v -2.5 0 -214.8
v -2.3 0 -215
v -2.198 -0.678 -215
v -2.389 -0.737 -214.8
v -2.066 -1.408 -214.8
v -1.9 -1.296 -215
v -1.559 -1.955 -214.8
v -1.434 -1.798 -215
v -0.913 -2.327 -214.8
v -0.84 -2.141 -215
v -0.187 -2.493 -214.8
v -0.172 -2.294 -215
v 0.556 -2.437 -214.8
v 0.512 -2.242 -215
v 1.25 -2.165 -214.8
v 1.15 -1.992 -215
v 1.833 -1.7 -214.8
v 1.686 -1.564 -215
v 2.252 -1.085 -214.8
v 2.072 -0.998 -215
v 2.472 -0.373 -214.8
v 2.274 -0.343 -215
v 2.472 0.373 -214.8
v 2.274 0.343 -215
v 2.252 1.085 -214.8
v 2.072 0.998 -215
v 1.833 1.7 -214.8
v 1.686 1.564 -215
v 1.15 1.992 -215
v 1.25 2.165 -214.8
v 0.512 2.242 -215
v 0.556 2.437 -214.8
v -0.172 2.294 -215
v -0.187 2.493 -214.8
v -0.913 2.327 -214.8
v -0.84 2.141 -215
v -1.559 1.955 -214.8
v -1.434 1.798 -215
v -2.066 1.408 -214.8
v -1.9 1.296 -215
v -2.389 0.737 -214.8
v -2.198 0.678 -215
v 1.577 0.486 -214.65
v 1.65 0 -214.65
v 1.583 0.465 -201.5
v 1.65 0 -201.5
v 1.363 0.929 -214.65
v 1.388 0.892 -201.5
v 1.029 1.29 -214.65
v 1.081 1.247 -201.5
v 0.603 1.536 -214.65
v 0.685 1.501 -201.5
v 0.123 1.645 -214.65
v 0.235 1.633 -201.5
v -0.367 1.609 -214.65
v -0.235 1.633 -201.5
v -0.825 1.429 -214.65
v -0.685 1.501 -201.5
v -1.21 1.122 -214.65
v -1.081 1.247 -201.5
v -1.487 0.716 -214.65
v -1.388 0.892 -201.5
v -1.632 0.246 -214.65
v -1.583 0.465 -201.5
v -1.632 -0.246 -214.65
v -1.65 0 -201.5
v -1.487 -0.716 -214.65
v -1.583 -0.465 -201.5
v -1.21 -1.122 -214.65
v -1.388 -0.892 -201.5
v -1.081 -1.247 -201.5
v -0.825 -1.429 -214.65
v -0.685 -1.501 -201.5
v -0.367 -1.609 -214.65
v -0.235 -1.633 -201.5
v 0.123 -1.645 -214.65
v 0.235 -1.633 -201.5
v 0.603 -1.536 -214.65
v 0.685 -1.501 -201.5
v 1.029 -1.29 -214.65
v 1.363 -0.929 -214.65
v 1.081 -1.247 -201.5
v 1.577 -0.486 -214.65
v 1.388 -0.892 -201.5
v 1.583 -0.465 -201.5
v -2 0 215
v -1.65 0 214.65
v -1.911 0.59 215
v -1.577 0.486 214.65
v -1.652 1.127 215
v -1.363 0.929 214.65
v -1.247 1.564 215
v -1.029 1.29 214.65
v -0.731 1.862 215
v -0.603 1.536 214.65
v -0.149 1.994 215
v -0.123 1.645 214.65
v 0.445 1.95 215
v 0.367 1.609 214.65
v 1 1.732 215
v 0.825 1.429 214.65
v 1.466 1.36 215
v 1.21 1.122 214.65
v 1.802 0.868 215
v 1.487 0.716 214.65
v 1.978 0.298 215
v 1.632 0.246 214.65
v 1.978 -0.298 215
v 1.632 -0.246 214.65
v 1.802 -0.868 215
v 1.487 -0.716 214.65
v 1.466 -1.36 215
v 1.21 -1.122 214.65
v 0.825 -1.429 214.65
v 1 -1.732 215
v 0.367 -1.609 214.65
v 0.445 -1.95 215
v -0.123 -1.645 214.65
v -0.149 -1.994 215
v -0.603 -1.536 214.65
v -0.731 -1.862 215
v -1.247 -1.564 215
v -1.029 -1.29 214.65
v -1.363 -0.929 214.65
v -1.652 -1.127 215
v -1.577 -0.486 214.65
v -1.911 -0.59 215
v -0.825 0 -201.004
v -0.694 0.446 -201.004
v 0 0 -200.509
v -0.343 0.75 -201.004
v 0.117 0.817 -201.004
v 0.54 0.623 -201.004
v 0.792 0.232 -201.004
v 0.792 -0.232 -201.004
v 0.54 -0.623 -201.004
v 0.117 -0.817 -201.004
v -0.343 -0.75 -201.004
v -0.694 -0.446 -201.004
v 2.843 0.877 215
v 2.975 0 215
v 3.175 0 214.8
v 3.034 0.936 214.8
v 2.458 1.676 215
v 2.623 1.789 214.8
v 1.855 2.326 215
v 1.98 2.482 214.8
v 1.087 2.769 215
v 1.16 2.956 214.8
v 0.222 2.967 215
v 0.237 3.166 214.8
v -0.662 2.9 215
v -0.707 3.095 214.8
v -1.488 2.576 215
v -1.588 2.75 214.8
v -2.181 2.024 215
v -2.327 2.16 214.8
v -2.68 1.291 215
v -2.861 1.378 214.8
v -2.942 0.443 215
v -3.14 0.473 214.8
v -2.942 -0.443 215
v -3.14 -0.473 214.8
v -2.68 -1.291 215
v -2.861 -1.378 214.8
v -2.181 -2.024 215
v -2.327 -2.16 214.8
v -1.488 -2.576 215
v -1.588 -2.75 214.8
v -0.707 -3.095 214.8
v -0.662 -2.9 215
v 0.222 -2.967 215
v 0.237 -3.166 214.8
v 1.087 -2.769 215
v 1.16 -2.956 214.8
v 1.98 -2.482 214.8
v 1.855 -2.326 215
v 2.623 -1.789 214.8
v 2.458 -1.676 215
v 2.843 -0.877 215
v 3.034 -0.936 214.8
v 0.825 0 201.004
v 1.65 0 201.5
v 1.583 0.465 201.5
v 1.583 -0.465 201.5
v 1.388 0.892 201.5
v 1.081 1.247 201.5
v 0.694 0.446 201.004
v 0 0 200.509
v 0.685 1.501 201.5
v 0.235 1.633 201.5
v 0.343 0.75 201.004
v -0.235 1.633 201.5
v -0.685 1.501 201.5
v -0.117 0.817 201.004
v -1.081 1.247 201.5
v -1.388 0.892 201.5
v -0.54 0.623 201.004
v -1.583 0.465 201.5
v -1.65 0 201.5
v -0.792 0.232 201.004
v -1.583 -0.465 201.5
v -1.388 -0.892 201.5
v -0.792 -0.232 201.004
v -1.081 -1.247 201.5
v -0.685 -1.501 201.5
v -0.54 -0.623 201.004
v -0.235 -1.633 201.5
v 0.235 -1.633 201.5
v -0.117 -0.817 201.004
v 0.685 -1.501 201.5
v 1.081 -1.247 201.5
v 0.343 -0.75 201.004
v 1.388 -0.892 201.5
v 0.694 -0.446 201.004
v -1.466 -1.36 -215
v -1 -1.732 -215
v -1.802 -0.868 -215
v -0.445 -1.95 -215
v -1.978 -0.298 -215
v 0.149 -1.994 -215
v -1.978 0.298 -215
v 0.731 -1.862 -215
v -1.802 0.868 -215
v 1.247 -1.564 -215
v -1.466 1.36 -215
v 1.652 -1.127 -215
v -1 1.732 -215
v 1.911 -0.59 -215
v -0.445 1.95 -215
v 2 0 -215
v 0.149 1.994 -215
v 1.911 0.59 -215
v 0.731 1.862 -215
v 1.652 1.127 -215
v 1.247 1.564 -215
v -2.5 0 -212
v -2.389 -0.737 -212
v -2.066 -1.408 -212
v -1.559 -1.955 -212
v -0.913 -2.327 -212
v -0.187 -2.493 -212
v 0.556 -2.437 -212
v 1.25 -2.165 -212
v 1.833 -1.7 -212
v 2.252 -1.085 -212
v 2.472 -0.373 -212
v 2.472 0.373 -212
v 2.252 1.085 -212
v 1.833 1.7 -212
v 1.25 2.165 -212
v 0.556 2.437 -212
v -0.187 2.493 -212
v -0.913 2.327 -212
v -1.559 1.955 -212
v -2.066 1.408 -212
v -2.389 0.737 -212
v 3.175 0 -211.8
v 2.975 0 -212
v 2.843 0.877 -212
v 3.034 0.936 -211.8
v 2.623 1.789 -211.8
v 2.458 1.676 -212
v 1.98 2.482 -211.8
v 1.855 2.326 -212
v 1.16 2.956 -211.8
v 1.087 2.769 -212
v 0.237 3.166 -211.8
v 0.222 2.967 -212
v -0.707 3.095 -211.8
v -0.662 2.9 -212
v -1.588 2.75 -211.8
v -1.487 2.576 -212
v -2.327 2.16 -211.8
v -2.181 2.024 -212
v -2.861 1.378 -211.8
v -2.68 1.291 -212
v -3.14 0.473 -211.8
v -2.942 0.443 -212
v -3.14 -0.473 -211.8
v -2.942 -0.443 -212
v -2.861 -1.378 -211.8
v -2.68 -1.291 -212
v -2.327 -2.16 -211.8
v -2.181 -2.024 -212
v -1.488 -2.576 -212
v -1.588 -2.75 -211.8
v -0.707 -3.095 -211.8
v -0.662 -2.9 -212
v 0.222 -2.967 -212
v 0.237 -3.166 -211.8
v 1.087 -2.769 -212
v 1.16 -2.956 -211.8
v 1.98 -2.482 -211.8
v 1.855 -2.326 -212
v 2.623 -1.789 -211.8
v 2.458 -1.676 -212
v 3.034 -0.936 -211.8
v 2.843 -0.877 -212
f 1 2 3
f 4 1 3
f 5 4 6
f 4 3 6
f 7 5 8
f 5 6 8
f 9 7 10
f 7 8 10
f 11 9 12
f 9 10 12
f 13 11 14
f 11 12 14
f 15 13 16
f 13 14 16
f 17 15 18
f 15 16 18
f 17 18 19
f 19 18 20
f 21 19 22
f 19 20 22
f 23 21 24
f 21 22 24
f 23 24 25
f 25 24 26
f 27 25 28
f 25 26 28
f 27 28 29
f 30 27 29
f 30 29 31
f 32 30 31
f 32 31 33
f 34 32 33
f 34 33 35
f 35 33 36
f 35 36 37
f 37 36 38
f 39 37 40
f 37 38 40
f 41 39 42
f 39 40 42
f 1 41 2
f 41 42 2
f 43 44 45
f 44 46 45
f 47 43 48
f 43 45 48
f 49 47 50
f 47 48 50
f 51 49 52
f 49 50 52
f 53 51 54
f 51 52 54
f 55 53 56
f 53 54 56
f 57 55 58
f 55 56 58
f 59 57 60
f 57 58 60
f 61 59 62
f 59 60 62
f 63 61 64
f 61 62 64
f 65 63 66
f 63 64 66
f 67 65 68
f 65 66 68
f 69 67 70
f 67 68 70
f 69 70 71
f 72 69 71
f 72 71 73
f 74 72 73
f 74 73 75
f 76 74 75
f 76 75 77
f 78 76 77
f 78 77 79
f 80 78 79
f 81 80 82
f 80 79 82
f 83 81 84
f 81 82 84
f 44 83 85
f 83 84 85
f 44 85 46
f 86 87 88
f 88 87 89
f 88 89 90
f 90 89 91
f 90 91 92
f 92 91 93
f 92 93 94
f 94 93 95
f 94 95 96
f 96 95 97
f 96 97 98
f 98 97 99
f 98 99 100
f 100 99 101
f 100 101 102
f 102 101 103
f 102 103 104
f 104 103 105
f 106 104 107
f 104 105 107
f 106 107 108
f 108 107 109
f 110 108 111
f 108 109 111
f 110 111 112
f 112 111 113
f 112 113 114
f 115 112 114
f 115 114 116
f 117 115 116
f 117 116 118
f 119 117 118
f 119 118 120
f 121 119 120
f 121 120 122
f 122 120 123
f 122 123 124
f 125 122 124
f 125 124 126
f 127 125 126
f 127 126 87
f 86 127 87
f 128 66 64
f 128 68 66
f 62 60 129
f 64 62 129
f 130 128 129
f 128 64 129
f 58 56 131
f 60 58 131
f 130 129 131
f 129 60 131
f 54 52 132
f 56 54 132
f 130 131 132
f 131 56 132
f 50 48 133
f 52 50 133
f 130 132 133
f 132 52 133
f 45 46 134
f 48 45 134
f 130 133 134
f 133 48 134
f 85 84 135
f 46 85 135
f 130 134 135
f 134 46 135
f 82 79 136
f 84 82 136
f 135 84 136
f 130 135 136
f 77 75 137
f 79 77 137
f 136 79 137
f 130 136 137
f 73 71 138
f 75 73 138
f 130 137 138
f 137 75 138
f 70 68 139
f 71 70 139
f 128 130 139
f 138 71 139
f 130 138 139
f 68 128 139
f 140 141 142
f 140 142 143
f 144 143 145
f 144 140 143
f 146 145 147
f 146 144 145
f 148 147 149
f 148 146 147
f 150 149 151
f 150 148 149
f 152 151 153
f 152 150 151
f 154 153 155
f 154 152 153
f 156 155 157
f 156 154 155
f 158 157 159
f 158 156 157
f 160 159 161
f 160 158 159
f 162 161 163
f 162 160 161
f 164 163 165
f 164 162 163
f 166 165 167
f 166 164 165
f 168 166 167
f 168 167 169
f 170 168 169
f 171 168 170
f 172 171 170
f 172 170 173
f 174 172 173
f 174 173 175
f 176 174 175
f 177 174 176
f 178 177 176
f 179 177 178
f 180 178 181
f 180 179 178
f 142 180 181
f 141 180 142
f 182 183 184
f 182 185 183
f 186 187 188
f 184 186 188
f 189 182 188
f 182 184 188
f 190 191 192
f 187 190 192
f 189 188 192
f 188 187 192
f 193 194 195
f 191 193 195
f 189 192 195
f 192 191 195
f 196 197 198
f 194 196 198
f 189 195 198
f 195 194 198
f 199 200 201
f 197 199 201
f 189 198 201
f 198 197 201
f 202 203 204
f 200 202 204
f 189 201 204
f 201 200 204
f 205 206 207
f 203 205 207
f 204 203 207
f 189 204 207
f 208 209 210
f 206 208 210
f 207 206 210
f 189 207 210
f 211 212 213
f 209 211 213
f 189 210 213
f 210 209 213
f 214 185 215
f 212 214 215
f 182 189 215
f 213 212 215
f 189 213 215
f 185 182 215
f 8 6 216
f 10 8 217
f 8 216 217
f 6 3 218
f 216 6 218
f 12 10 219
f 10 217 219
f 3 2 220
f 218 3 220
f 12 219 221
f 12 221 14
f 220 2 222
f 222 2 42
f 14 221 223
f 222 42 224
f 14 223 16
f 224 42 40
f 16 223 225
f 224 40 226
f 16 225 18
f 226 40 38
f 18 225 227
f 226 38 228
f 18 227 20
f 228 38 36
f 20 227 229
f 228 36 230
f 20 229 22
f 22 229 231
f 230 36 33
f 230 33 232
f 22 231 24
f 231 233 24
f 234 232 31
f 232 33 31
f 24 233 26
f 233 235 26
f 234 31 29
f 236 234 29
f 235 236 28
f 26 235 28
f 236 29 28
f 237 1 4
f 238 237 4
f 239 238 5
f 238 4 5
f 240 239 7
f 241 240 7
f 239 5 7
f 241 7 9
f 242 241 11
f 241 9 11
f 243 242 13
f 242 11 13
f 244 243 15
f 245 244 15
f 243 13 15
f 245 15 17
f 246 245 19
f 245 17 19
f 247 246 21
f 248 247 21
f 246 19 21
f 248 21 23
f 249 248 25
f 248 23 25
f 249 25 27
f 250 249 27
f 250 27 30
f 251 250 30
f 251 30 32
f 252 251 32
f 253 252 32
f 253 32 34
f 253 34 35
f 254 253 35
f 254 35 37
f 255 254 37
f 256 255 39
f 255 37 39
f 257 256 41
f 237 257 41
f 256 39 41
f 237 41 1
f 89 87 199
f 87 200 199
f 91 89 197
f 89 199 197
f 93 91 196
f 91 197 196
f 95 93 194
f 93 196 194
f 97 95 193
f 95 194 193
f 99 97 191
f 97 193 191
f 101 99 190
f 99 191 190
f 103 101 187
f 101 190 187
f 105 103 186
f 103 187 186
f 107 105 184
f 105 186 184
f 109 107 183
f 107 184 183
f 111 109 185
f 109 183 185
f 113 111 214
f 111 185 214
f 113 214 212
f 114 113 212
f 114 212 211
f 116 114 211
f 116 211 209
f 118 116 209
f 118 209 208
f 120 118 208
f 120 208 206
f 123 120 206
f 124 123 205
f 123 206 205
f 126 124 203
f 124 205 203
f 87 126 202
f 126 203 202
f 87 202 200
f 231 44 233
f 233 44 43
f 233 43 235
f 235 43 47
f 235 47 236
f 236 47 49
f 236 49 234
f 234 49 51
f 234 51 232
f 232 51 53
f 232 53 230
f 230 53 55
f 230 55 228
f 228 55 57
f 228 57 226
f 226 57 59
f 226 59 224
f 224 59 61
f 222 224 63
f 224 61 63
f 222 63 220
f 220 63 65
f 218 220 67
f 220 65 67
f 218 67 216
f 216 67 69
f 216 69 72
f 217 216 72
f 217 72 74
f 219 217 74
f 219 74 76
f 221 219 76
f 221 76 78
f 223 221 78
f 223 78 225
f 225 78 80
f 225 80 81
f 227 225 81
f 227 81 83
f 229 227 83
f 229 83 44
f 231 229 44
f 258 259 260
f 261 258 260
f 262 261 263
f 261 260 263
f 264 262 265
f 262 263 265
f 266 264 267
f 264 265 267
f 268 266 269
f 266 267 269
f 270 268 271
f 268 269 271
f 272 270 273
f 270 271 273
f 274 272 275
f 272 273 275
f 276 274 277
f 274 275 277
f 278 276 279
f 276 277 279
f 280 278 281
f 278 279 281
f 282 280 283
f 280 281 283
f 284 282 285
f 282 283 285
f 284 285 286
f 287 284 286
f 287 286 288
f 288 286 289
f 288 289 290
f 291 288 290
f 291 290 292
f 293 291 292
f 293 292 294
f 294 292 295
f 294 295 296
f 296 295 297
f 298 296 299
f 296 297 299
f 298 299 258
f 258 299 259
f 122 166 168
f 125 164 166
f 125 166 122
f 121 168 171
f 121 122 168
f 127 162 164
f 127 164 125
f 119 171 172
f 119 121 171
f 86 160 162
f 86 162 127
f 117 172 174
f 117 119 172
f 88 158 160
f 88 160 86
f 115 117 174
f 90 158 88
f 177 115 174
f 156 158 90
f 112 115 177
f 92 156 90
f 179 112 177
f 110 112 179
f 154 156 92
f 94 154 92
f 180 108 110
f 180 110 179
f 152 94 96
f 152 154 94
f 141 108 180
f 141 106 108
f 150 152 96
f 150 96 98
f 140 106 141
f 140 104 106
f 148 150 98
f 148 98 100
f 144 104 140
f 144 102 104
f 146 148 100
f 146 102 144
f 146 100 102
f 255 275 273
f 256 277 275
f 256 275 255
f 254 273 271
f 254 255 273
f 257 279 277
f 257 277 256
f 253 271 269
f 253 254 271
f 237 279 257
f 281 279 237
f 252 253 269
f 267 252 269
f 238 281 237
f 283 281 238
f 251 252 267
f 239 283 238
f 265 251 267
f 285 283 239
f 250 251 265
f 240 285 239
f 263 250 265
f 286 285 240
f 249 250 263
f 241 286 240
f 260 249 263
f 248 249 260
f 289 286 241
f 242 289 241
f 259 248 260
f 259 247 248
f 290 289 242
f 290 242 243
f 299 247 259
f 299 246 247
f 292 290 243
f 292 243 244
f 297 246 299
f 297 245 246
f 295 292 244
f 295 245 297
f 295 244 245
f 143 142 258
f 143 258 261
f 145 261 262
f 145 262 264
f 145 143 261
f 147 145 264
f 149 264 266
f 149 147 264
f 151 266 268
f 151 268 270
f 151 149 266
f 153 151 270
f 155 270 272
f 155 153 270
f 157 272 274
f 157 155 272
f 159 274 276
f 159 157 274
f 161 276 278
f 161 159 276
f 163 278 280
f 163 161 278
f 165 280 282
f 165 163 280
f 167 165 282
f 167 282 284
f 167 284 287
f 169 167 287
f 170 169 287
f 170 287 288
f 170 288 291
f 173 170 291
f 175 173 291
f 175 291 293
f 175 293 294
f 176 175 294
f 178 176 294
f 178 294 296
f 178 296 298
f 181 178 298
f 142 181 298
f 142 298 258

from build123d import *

# Parameters (mm, degrees)
SKETCH1_R                       = 3.175
BOSS_EXTRUDE1_DEPTH             = 215
M4X0_7_TAPPED_HOLE1_D           = 3.3
M4X0_7_TAPPED_HOLE1_DEPTH       = 13.5
M4X0_7_TAPPED_HOLE1_CSINK_D     = 4
M4X0_7_TAPPED_HOLE1_CSINK_ANGLE = 90
M4X0_7_TAPPED_HOLE1_TIP         = 0.991420021
M4X0_7_TAPPED_HOLE2_D           = 3.3
M4X0_7_TAPPED_HOLE2_DEPTH       = 13.5
M4X0_7_TAPPED_HOLE2_CSINK_D     = 4
M4X0_7_TAPPED_HOLE2_CSINK_ANGLE = 90
M4X0_7_TAPPED_HOLE2_TIP         = 0.991420021
SKETCH7_W                       = 0.675
SKETCH7_H                       = 3
CHAMFER1_SIZE                   = 0.2


with BuildPart() as part:
    # Sketch1 → Boss-Extrude1 (new, symmetric)
    with BuildSketch(Plane.XY):
        Circle(SKETCH1_R)
    extrude(amount=BOSS_EXTRUDE1_DEPTH, both=True)

    # M4x0.7 Tapped Hole1
    with Locations(Plane(origin=(0, 0, -215), x_dir=(-1, 0, 0), z_dir=(0, 0, -1))):
        with Locations((0, 0)):
            CounterSinkHole(M4X0_7_TAPPED_HOLE1_D / 2, M4X0_7_TAPPED_HOLE1_CSINK_D / 2, depth=M4X0_7_TAPPED_HOLE1_DEPTH, counter_sink_angle=M4X0_7_TAPPED_HOLE1_CSINK_ANGLE)
            with Locations((0, 0, -(M4X0_7_TAPPED_HOLE1_DEPTH + M4X0_7_TAPPED_HOLE1_TIP / 2))):  # 118° drill point
                Cone(0, M4X0_7_TAPPED_HOLE1_D / 2, M4X0_7_TAPPED_HOLE1_TIP, mode=Mode.SUBTRACT)

    # M4x0.7 Tapped Hole2
    with Locations(Plane.XY.offset(215)):
        with Locations((0, 0)):
            CounterSinkHole(M4X0_7_TAPPED_HOLE2_D / 2, M4X0_7_TAPPED_HOLE2_CSINK_D / 2, depth=M4X0_7_TAPPED_HOLE2_DEPTH, counter_sink_angle=M4X0_7_TAPPED_HOLE2_CSINK_ANGLE)
            with Locations((0, 0, -(M4X0_7_TAPPED_HOLE2_DEPTH + M4X0_7_TAPPED_HOLE2_TIP / 2))):  # 118° drill point
                Cone(0, M4X0_7_TAPPED_HOLE2_D / 2, M4X0_7_TAPPED_HOLE2_TIP, mode=Mode.SUBTRACT)

    # Sketch7 → Cut-Revolve1 (revolve, cut)
    with BuildSketch(Plane(origin=(0, 0, 0), x_dir=(1, 0, 0), z_dir=(0, 1, 0)), mode=Mode.PRIVATE) as cut_revolve1_sk:
        with Locations((2.8375, 213.5)):
            Rectangle(SKETCH7_W, SKETCH7_H)
    revolve(cut_revolve1_sk.sketch.rotate(Axis((0, 0, -232.2463), (0, 0, 1)), 180), axis=Axis((0, 0, -232.2463), (0, 0, 1)), mode=Mode.SUBTRACT)

    # Chamfer1
    chamfer1_edges = [part.edges().sort_by_distance(p)[0] for p in [
        (2.5, 0, -215),
        (-3.175, 0, -212),
        (-3.175, 0, 215),
    ]]
    chamfer(chamfer1_edges, length=CHAMFER1_SIZE)


solid = part.part
